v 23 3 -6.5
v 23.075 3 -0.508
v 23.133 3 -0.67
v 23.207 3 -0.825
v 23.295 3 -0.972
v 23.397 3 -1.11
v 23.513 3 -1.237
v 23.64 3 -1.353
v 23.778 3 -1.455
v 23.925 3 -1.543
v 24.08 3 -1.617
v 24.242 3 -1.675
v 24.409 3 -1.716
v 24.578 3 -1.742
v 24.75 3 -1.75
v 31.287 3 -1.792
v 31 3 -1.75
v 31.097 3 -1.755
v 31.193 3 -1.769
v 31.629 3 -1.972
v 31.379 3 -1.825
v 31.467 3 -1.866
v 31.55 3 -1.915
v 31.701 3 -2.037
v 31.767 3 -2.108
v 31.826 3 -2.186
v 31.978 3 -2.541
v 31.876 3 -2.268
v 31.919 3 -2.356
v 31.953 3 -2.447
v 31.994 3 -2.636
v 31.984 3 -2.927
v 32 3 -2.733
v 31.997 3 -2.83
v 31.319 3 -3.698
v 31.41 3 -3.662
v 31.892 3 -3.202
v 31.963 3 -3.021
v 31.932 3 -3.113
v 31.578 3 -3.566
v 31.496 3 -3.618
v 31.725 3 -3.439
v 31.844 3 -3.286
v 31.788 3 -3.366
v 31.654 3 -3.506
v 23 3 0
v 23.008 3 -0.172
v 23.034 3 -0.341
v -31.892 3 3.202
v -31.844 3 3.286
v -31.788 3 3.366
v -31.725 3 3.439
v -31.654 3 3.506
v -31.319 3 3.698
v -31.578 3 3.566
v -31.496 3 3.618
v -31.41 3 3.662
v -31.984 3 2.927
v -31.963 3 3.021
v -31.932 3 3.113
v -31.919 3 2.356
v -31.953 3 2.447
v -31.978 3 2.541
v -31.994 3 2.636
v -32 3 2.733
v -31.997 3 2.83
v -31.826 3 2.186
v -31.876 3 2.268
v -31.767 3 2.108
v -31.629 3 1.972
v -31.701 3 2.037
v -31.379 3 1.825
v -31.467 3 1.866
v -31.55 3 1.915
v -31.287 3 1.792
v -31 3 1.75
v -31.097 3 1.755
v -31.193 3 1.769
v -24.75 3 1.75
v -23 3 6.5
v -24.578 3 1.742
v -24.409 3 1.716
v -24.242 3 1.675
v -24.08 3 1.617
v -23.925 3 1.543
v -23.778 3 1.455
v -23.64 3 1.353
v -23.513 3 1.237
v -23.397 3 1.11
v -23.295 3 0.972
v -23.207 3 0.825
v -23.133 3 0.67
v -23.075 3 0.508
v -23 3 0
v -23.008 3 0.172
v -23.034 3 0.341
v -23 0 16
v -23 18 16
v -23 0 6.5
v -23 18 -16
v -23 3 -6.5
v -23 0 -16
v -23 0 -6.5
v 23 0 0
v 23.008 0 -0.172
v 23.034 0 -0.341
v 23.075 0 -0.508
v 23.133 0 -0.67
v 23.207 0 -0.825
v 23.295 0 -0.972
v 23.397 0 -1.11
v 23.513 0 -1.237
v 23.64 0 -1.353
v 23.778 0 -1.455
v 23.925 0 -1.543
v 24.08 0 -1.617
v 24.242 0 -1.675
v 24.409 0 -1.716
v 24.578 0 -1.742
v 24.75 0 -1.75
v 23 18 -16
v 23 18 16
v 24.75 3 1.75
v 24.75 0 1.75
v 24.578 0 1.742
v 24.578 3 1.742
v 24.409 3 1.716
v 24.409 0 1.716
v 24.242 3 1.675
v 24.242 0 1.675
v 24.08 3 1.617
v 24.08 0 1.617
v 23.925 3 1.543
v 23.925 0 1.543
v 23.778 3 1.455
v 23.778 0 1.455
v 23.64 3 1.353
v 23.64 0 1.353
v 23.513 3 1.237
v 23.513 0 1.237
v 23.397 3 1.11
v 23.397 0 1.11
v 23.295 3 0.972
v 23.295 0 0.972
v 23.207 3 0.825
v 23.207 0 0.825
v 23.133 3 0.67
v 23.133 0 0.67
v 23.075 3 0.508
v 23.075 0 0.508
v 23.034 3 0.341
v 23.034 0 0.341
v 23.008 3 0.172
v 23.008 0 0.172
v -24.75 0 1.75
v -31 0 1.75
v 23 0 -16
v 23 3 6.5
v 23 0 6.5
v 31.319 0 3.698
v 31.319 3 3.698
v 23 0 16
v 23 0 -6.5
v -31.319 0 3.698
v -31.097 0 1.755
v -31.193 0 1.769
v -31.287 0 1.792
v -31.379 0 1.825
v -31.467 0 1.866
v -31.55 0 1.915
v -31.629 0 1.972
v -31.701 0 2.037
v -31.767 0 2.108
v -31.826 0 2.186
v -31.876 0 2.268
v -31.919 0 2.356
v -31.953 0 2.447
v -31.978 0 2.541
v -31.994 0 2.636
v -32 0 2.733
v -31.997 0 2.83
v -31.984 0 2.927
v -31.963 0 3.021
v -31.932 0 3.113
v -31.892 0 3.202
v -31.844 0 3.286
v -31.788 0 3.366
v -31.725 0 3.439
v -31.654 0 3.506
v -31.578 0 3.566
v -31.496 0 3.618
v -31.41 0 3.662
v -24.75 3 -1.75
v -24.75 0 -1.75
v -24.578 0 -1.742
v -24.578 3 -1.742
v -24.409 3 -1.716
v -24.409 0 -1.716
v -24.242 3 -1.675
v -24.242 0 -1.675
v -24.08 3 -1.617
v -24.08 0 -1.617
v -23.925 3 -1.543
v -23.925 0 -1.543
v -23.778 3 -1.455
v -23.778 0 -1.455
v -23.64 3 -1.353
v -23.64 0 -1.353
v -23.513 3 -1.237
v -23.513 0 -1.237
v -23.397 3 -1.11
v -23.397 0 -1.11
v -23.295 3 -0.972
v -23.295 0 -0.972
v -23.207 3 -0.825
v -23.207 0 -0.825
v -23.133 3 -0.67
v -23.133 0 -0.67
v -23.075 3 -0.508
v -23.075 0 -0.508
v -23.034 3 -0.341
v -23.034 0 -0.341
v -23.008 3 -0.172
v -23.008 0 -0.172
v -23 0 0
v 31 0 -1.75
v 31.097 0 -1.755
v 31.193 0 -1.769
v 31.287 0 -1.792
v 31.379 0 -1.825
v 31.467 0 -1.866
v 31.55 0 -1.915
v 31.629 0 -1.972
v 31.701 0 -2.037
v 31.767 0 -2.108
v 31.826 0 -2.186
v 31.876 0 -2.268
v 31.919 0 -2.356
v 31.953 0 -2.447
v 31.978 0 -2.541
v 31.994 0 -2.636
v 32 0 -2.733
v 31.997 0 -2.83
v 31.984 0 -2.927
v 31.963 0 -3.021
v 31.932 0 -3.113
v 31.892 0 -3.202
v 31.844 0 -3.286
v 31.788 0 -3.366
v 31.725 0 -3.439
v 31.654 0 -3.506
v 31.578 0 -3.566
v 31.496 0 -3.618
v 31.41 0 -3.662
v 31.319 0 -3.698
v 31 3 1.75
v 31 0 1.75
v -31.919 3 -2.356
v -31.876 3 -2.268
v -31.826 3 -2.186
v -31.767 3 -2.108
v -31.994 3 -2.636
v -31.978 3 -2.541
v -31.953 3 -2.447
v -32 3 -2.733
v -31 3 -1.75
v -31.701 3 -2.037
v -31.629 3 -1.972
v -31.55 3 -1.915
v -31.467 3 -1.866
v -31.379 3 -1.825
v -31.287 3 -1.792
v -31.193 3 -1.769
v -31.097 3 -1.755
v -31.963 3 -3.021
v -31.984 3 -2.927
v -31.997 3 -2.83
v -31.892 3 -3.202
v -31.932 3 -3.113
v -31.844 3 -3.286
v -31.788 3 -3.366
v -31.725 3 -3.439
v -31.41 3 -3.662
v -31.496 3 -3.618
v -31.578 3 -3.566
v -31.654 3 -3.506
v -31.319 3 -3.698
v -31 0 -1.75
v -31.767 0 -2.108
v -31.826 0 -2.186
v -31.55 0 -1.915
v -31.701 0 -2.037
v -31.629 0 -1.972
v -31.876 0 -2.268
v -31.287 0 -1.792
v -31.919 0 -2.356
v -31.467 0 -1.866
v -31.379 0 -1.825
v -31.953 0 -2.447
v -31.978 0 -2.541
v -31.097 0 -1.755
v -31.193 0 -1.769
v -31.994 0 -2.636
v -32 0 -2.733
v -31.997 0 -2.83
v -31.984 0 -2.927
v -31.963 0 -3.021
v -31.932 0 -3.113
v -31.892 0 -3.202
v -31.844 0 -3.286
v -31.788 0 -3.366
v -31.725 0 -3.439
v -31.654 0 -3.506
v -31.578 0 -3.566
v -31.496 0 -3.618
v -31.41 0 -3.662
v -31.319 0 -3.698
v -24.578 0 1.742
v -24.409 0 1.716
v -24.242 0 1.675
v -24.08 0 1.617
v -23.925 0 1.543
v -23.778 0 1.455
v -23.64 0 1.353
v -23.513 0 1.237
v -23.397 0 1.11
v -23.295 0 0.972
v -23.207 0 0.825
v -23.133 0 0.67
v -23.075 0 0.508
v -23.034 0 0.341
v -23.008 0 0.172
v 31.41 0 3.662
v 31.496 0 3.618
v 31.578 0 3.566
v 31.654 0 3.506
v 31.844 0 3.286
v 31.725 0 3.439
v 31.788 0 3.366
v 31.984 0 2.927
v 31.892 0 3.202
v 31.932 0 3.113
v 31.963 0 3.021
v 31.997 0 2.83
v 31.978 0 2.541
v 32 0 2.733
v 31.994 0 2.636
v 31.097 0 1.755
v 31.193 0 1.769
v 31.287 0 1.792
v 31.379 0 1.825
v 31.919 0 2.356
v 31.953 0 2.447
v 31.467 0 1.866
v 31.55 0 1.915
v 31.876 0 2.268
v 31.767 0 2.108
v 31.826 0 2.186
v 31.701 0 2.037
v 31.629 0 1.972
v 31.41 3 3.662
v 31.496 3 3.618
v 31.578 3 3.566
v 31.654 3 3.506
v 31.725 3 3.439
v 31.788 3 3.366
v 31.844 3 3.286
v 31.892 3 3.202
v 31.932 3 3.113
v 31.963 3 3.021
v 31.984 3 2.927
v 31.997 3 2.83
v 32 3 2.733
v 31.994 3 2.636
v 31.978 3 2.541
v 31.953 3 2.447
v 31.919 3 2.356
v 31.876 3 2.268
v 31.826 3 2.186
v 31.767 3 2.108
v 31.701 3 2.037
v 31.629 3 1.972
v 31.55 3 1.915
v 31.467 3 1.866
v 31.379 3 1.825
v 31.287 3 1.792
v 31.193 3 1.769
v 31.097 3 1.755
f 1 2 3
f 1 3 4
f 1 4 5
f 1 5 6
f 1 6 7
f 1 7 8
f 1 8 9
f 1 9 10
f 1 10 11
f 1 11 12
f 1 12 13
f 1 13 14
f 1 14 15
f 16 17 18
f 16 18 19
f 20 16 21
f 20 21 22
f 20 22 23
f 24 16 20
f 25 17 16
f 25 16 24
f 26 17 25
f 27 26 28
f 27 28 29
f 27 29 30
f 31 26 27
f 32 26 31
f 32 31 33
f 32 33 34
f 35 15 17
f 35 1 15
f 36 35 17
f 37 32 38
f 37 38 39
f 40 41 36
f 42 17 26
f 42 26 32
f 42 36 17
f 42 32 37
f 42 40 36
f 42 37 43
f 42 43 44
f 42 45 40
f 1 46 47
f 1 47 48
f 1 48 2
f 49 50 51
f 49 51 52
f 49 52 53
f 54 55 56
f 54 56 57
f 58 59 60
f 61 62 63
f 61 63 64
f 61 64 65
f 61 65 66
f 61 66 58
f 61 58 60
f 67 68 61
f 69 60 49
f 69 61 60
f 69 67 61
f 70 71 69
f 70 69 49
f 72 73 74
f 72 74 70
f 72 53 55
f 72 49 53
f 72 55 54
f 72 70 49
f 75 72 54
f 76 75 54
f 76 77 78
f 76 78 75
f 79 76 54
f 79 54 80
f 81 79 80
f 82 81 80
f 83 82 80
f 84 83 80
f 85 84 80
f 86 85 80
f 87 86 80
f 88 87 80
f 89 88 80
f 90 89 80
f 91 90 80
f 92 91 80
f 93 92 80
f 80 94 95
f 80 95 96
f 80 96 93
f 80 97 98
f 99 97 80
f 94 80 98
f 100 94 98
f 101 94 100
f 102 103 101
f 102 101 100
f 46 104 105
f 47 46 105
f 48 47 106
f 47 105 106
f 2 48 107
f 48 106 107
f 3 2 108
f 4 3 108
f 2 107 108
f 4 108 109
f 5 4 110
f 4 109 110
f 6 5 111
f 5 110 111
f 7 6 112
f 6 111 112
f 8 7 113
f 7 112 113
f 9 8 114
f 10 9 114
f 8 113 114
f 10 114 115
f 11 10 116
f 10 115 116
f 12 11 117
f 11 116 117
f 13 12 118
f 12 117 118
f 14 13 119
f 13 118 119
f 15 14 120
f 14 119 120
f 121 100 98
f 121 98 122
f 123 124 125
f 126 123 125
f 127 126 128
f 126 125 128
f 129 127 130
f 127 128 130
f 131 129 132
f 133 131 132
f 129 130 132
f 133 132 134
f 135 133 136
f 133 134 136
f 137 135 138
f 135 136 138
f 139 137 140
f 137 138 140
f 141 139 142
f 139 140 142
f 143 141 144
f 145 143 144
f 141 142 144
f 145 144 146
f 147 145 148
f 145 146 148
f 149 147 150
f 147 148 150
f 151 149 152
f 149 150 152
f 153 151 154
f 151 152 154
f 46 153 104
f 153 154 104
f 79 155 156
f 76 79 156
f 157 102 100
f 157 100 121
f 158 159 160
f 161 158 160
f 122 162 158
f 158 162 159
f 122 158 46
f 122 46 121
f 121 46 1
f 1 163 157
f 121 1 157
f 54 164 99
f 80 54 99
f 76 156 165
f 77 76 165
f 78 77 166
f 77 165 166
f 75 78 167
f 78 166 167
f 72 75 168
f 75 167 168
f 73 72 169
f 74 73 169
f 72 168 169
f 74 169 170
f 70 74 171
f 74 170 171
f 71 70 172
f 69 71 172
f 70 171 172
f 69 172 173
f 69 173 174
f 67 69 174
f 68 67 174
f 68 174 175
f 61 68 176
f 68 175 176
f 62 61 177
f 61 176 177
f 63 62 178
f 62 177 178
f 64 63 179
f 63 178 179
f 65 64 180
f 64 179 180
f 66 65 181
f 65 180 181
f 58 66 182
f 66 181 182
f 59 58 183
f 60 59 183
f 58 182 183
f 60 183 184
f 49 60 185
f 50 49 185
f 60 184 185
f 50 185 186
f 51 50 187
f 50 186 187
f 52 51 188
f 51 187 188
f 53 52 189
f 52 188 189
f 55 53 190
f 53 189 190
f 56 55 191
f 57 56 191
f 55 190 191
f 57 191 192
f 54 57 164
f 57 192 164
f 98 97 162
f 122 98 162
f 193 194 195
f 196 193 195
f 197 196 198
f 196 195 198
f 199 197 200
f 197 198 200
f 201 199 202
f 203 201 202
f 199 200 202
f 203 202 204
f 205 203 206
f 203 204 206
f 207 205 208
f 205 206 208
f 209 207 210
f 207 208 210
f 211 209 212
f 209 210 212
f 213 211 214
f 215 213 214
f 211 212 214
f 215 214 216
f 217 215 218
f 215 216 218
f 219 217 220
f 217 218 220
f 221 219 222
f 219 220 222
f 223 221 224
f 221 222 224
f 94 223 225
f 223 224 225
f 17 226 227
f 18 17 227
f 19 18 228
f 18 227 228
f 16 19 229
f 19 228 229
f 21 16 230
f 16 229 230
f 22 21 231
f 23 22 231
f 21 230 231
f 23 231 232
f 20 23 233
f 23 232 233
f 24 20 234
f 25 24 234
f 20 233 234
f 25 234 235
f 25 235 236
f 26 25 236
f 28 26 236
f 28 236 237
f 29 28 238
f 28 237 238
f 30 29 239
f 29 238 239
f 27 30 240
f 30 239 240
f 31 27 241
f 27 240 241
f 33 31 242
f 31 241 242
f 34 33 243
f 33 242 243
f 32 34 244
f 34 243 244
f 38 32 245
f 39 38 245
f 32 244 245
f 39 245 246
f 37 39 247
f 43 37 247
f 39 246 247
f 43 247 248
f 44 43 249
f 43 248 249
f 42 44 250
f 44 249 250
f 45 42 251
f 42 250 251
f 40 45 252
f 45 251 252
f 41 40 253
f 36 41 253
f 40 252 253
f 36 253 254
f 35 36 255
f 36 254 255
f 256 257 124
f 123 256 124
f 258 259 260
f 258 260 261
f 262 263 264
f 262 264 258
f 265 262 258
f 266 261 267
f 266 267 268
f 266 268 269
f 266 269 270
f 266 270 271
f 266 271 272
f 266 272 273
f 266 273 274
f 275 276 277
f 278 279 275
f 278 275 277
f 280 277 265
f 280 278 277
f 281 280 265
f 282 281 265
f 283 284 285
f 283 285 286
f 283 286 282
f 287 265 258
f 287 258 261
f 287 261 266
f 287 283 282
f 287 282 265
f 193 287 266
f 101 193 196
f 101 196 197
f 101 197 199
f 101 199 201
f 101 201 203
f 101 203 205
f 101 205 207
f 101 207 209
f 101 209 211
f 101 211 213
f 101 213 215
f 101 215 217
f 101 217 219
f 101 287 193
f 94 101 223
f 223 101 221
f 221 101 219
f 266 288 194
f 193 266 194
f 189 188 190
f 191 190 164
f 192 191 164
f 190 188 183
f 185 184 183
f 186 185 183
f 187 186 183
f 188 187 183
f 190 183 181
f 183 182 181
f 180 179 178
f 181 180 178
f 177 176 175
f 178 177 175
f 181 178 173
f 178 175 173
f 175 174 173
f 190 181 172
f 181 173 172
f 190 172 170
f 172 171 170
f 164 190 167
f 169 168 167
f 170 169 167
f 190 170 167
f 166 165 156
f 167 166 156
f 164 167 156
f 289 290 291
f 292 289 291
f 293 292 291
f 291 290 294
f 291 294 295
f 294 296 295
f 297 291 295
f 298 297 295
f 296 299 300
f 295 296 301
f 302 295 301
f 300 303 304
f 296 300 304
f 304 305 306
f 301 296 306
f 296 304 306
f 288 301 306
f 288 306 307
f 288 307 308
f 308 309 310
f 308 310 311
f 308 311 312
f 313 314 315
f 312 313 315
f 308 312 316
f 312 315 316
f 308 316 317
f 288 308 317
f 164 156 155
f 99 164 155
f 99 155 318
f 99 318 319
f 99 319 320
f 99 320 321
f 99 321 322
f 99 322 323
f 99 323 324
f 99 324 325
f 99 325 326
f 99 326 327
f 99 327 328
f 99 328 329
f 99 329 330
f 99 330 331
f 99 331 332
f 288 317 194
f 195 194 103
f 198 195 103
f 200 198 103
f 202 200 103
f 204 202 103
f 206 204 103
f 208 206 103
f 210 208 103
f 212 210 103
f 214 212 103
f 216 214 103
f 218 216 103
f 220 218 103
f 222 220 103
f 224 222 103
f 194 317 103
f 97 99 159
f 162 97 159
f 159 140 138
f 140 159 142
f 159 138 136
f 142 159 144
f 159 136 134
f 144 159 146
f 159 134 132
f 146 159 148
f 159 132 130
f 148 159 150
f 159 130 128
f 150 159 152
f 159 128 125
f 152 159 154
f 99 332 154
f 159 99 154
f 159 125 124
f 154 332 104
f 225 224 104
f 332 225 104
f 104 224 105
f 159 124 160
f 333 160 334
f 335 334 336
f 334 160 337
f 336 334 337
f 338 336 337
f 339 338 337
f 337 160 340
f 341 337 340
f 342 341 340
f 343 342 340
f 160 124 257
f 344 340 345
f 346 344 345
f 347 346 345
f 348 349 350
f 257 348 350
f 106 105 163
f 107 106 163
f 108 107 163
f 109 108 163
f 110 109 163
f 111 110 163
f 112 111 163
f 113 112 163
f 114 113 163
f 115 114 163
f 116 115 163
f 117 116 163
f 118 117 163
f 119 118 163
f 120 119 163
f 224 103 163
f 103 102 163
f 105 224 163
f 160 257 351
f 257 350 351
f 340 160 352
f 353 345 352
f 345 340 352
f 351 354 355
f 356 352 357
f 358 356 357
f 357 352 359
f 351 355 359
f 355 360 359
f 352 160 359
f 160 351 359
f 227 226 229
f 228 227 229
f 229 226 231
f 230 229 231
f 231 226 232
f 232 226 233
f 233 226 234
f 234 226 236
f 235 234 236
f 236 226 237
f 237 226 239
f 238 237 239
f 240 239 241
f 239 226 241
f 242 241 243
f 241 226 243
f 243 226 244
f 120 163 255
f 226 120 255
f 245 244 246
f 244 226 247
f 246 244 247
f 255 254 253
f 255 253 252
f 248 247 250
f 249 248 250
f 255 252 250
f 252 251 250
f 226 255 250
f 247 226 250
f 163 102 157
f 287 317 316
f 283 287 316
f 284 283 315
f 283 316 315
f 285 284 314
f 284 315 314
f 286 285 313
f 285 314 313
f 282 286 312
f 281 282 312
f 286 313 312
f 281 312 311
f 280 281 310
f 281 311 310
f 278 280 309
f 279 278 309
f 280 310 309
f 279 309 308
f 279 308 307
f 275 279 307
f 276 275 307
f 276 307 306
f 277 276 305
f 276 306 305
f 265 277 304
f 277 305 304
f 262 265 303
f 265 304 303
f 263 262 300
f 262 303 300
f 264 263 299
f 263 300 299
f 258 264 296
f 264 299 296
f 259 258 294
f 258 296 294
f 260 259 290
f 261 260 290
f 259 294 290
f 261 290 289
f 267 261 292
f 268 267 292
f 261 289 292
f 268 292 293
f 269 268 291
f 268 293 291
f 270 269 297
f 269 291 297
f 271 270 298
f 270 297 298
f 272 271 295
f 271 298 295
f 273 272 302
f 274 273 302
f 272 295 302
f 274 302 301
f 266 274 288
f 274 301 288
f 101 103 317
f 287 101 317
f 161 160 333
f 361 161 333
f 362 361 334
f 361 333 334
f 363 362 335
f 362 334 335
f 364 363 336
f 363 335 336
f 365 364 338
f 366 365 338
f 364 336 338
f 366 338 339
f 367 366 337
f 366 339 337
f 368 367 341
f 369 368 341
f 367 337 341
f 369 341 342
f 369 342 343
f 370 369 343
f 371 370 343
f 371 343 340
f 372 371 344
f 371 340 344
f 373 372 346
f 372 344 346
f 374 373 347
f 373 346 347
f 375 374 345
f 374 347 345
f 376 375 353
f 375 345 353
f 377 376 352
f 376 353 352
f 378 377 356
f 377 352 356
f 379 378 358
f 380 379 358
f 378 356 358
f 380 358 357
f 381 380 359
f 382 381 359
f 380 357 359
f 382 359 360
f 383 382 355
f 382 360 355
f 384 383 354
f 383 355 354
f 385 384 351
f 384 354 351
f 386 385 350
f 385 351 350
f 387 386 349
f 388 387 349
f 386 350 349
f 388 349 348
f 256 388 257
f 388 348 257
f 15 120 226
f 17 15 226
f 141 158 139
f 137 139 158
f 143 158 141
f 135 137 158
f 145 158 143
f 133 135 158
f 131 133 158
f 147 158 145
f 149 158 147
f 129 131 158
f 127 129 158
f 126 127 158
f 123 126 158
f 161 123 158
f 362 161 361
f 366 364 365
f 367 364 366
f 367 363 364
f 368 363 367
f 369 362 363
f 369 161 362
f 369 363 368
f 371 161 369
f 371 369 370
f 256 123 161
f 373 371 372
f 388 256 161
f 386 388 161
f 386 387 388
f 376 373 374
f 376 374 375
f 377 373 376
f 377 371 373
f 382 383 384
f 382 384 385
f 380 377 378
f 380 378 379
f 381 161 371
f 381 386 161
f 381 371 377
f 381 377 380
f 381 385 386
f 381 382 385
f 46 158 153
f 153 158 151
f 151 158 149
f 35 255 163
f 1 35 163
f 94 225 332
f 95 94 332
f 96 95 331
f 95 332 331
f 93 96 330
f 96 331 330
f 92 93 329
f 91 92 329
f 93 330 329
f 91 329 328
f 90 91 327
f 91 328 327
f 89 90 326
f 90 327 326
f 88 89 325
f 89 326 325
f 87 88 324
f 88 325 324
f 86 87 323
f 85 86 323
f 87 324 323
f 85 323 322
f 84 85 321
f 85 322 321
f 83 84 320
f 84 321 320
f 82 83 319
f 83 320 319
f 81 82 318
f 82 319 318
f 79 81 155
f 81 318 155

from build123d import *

# Parameters (mm, degrees)
SKETCH1_W           = 46
SKETCH1_H           = 32
BOSS_EXTRUDE1_DEPTH = 18
BOSS_EXTRUDE2_DEPTH = 3


with BuildPart() as part:
    # Sketch1 → Boss-Extrude1 (new body)
    with BuildSketch(Plane(origin=(0, 0, 0), x_dir=(1, 0, 0), z_dir=(0, 1, 0))):
        Rectangle(SKETCH1_W, SKETCH1_H)
    extrude(amount=BOSS_EXTRUDE1_DEPTH)

    # Sketch2 → Boss-Extrude2 (add)
    with BuildSketch(Plane(origin=(0, 0, 0), x_dir=(1, 0, 0), z_dir=(0, 1, 0))):
        with BuildLine():
            Line((-31, 1.75), (-24.75, 1.75))
            ThreePointArc((-24.75, 1.75), (-23.512563133, 1.237436867), (-23, 0))
            Line((-23, 0), (-23, 6.5))
            Line((-23, 6.5), (-31.319224576, 3.697679096))
            ThreePointArc((-31.319224576, 3.697679096), (-31.98683309, 2.58825807), (-31, 1.75))
        make_face()
        with BuildLine():
            Line((-23, -6.5), (-23, 0))
            ThreePointArc((-23, 0), (-23.512563133, -1.237436867), (-24.75, -1.75))
            Line((-24.75, -1.75), (-31, -1.75))
            ThreePointArc((-31, -1.75), (-31.98683309, -2.58825807), (-31.319224576, -3.697679096))
            Line((-31.319224576, -3.697679096), (-23, -6.5))
        make_face()
        with BuildLine():
            Line((31.319224576, 3.697679096), (23, 6.5))
            Line((23, 6.5), (23, 0))
            ThreePointArc((23, 0), (23.512563133, 1.237436867), (24.75, 1.75))
            Line((24.75, 1.75), (31, 1.75))
            ThreePointArc((31, 1.75), (31.98683309, 2.58825807), (31.319224576, 3.697679096))
        make_face()
        with BuildLine():
            ThreePointArc((24.75, -1.75), (23.512563133, -1.237436867), (23, 0))
            Line((23, 0), (23, -6.5))
            Line((23, -6.5), (31.319224576, -3.697679096))
            ThreePointArc((31.319224576, -3.697679096), (31.98683309, -2.58825807), (31, -1.75))
            Line((31, -1.75), (24.75, -1.75))
        make_face()
    extrude(amount=BOSS_EXTRUDE2_DEPTH)


solid = part.part
